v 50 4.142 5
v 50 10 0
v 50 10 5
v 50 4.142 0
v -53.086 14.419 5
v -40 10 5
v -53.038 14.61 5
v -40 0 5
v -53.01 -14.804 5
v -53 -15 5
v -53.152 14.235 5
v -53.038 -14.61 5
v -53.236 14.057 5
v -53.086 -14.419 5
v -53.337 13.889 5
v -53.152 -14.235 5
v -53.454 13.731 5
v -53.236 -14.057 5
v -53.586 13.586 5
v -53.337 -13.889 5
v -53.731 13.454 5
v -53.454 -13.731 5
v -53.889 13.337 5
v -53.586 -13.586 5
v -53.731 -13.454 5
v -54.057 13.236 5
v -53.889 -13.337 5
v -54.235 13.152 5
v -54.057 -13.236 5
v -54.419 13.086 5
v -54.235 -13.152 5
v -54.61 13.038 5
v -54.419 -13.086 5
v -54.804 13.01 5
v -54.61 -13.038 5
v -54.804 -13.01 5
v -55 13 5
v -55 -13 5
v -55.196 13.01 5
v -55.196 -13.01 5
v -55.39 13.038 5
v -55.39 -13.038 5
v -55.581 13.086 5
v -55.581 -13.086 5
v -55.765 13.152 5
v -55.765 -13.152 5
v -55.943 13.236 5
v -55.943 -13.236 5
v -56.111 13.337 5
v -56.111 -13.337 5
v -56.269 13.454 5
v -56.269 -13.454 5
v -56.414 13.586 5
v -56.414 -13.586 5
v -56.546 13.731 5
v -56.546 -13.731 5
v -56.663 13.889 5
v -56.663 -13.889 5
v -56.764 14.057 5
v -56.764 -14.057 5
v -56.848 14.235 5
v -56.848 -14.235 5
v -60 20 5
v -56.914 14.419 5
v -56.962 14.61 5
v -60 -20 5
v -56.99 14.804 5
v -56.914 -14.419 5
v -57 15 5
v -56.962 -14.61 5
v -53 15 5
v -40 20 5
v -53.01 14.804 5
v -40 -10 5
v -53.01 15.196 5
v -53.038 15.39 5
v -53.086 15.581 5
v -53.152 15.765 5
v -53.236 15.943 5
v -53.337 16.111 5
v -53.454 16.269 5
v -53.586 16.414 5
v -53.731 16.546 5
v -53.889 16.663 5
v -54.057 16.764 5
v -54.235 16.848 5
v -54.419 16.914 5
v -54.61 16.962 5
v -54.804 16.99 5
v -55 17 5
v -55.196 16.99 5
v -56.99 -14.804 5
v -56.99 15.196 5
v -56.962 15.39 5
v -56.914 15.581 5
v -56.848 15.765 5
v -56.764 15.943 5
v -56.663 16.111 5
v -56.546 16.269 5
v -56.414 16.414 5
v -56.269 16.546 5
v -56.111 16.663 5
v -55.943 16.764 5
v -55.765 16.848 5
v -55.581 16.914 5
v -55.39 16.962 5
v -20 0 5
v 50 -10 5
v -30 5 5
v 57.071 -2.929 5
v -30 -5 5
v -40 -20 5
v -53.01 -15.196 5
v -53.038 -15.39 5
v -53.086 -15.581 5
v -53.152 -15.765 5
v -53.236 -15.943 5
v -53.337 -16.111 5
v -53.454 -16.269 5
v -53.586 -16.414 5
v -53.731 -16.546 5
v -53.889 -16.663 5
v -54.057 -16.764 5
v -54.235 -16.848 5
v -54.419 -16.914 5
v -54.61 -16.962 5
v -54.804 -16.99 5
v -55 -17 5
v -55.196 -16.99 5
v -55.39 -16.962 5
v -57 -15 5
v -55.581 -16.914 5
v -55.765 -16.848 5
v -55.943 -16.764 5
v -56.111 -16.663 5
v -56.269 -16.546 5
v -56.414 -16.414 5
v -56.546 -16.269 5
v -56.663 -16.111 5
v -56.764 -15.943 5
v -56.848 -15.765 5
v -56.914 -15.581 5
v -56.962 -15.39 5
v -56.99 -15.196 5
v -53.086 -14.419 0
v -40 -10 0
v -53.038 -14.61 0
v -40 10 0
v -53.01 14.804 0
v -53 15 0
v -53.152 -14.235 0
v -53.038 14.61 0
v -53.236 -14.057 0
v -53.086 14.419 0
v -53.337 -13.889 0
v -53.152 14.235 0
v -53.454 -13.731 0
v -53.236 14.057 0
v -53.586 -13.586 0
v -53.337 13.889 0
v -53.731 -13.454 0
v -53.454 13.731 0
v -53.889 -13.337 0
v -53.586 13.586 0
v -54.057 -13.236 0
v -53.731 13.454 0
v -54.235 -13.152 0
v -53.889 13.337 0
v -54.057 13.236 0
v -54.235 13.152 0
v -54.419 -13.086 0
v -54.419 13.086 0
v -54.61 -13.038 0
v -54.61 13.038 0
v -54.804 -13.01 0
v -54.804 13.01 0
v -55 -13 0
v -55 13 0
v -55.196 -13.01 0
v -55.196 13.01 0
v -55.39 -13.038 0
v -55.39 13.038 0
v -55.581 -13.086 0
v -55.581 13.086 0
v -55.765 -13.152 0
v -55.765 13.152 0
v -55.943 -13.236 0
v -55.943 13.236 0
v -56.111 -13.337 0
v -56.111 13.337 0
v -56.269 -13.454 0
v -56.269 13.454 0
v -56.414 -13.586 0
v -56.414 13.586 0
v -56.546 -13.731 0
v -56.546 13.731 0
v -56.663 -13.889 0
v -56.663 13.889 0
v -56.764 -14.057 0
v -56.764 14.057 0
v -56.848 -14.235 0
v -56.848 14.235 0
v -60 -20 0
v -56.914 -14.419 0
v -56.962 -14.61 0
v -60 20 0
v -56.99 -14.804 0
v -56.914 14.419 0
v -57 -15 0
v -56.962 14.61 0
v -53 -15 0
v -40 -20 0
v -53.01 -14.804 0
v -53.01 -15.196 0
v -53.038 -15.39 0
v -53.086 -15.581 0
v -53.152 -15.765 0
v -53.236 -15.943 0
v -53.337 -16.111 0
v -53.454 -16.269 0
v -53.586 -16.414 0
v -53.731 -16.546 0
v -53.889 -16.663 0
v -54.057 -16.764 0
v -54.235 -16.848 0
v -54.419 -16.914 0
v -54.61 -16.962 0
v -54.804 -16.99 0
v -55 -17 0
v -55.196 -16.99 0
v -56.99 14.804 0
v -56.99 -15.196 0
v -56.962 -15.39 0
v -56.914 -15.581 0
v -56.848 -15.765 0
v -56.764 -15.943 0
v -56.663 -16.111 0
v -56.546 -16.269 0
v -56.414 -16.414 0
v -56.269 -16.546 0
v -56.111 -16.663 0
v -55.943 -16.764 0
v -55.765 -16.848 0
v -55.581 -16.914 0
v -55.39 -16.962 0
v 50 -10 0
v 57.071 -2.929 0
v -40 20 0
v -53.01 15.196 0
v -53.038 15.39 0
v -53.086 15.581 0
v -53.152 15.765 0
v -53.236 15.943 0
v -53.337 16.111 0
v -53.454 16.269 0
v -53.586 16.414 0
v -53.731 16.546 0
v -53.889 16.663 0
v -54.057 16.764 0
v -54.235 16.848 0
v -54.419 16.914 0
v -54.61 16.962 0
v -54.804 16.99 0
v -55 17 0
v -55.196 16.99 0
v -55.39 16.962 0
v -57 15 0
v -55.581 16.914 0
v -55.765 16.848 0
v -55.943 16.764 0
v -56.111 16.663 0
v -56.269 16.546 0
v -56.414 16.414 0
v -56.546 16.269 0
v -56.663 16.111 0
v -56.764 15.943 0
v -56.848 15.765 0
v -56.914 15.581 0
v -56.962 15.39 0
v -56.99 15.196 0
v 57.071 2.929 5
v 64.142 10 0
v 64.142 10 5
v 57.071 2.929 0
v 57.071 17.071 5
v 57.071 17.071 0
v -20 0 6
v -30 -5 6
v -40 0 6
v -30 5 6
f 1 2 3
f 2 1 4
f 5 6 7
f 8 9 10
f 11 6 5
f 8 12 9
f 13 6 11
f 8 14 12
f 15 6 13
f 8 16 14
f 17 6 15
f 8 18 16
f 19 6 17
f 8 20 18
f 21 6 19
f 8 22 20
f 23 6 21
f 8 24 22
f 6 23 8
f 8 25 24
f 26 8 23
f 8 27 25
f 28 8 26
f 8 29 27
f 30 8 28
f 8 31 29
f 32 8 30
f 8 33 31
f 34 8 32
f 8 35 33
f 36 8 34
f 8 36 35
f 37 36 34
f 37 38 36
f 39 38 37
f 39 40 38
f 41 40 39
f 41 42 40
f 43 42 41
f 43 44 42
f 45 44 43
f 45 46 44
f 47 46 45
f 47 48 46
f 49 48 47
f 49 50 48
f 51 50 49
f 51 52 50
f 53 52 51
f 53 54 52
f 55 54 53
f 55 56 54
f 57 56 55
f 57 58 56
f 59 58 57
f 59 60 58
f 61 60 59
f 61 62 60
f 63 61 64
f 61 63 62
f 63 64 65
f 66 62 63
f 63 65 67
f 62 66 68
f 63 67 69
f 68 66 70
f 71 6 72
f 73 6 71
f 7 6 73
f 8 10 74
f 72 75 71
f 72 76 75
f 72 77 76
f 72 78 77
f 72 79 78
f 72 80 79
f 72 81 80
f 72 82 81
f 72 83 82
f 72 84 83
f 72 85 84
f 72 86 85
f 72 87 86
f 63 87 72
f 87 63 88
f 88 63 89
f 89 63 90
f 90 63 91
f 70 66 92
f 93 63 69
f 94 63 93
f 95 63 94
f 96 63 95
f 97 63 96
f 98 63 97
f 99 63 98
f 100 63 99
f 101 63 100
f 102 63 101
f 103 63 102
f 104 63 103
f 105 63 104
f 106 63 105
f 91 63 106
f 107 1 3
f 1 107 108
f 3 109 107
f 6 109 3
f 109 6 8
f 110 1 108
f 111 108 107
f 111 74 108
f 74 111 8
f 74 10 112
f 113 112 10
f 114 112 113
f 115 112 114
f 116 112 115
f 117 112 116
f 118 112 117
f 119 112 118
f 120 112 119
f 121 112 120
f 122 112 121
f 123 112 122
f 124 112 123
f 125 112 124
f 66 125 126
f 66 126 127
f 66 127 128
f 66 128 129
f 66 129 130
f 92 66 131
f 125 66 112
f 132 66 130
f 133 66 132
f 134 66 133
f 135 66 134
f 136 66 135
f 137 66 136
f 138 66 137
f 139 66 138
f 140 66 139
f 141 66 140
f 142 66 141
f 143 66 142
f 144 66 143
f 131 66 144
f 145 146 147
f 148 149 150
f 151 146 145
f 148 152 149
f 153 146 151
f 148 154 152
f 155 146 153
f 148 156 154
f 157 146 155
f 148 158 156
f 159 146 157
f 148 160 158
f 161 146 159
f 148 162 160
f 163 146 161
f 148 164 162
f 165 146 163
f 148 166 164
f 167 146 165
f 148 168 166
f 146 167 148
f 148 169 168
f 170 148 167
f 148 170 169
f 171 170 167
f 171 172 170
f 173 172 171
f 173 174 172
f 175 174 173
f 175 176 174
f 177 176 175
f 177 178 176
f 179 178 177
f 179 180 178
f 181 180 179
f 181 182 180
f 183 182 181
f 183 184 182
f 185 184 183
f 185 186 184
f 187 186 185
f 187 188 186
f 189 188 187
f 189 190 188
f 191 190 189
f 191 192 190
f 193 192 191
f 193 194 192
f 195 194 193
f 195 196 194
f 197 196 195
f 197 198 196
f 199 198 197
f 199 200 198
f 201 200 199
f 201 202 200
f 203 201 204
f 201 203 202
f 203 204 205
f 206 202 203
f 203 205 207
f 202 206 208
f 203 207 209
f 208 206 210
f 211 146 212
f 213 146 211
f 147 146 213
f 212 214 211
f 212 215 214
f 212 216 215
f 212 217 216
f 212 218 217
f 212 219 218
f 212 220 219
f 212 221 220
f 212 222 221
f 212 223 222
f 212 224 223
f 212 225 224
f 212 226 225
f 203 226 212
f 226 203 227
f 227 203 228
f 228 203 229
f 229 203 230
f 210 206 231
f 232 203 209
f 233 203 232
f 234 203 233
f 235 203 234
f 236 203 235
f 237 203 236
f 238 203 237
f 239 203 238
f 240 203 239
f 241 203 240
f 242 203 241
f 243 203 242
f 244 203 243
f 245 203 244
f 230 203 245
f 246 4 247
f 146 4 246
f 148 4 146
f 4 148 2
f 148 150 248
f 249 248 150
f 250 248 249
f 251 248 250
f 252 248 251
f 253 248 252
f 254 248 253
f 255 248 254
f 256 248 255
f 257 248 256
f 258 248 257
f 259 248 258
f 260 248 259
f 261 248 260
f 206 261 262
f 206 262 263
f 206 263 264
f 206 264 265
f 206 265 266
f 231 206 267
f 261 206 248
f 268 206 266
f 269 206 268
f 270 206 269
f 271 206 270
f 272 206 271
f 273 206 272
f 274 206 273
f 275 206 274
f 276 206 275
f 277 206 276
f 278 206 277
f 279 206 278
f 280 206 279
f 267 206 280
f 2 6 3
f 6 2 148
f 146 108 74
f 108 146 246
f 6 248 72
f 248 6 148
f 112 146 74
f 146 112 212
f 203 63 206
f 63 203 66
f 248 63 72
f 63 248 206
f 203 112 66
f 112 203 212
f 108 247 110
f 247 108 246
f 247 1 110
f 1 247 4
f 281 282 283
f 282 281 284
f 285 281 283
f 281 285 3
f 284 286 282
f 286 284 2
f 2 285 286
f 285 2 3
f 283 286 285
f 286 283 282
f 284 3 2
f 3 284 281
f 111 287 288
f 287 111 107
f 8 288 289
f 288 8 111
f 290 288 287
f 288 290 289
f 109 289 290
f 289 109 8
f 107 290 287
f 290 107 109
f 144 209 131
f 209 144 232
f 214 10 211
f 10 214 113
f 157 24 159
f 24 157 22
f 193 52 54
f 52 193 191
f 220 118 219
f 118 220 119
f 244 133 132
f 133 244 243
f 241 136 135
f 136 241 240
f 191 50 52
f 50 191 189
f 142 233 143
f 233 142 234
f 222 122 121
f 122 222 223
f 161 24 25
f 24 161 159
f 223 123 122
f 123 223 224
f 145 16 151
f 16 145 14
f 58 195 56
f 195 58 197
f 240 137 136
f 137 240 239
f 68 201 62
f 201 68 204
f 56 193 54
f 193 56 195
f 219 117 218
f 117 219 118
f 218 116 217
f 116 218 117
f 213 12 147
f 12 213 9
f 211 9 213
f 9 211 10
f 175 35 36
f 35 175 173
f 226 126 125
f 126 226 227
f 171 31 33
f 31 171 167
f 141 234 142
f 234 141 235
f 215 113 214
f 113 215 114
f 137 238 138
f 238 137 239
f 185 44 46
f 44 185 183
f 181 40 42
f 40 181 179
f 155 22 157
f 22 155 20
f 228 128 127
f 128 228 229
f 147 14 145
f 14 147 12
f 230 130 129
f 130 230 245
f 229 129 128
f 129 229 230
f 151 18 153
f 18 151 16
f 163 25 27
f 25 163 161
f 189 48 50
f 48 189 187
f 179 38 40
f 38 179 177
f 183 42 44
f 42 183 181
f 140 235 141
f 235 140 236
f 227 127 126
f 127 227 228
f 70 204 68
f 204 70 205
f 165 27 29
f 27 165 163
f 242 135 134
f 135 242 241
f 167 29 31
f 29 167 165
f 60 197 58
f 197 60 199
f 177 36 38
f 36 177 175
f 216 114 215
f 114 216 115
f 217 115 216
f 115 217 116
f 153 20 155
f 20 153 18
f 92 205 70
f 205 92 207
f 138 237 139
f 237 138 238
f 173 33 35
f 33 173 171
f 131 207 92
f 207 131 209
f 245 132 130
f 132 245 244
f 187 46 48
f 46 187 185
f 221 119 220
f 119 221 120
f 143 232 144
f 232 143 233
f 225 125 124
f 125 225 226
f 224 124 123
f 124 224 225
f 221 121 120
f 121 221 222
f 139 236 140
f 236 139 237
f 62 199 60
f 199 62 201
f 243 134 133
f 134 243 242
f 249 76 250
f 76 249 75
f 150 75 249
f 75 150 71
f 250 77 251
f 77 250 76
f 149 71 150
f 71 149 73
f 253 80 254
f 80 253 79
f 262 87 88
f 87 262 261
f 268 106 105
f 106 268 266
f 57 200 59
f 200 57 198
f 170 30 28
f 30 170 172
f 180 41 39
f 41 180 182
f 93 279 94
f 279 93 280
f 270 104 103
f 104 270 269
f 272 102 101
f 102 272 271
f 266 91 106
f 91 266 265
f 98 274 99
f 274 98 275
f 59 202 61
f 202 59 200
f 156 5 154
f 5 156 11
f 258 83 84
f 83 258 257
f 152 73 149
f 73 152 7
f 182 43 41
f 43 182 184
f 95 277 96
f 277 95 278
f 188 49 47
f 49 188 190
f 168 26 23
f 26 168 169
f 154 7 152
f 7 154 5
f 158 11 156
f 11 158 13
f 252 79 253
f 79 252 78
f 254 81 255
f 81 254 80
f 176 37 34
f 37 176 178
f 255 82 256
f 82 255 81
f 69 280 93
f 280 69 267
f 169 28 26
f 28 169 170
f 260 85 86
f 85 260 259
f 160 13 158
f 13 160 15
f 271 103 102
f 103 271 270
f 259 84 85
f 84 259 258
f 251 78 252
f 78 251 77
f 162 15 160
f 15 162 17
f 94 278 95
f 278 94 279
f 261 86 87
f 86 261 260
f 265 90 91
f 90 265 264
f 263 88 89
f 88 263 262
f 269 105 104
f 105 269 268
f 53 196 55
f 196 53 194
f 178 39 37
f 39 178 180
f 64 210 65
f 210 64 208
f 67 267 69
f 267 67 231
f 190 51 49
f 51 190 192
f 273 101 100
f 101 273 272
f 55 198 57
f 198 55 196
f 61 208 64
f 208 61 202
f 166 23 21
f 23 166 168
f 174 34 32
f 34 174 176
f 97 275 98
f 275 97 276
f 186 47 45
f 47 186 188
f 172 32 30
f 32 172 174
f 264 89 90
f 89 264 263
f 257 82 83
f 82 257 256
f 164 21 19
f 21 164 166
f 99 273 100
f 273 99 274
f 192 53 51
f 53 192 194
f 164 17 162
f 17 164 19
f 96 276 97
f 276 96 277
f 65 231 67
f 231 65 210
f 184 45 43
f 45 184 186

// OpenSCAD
module bracket() {
    difference() {
        union() {
            // Main body
            translate([-50, -10, 0])
            cube([100, 20, 5]);

            // Flanged end
            translate([-60, -20, 0])
            cube([20, 40, 5]);

            // Chamfered corners
            translate([50, -10, 0])
            rotate([0, 0, 45])
            cube([10, 10, 5]);

            translate([50, 10, 0])
            rotate([0, 0, -45])
            cube([10, 10, 5]);

            // Embossed V-shape
            translate([-30, -5, 5])
            linear_extrude(height=1)
            polygon(points=[[0, 0], [10, 5], [0, 10], [-10, 5]]);
        }

        // Through-holes on flanged end
        translate([-55, -15, -1])
        cylinder(h=7, r=2, $fn=64);

        translate([-55, 15, -1])
        cylinder(h=7, r=2, $fn=64);
    }
}

bracket();
